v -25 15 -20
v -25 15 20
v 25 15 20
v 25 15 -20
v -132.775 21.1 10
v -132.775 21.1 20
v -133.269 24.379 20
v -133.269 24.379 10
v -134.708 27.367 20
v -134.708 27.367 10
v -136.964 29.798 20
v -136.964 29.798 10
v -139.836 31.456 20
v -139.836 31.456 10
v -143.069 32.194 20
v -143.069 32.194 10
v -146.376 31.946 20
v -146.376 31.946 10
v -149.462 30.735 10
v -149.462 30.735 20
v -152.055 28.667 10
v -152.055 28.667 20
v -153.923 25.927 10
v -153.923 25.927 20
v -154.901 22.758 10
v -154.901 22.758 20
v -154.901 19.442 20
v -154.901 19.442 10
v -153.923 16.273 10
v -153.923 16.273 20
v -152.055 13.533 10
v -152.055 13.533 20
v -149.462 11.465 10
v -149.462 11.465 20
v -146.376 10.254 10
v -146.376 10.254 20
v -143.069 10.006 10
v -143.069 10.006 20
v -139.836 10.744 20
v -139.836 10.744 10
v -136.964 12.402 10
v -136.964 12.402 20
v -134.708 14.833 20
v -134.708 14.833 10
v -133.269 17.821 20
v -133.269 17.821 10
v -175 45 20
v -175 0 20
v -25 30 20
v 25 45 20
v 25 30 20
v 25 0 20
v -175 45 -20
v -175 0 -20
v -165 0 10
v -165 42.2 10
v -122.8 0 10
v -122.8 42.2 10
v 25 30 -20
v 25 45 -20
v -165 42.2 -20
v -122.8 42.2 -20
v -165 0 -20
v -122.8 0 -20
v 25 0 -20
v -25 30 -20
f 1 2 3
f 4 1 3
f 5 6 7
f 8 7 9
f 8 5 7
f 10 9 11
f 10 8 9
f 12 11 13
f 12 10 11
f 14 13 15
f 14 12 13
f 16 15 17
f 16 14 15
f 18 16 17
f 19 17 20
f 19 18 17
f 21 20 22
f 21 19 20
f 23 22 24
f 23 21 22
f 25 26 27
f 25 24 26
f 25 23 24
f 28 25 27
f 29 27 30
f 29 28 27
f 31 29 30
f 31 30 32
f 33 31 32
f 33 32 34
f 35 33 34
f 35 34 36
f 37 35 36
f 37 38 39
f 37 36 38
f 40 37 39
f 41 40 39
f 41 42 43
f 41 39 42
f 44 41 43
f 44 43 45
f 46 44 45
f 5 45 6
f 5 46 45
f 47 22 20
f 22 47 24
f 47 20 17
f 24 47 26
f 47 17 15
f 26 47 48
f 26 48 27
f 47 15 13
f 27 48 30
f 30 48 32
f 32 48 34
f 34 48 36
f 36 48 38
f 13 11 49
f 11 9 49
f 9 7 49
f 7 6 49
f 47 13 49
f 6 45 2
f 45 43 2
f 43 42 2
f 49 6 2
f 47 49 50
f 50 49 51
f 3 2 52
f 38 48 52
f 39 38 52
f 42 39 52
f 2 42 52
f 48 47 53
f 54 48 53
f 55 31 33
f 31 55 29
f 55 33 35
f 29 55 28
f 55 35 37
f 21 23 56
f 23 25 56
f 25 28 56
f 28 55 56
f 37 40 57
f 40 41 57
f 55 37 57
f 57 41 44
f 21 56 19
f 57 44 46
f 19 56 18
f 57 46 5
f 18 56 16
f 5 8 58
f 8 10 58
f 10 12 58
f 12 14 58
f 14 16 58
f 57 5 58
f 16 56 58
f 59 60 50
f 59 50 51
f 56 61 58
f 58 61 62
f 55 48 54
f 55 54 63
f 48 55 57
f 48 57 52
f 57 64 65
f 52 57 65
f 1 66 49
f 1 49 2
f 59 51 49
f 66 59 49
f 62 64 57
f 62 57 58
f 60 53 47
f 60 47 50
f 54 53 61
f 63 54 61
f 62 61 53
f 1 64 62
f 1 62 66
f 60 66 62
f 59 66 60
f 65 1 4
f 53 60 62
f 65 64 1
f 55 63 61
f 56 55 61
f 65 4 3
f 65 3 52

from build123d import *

# Parameters (mm, degrees)
CROQUIS1_W              = 350
CROQUIS1_H              = 40
SALIENTE_EXTRUIR1_DEPTH = 45
CROQUIS2_W              = 42.2
CROQUIS2_H              = 42.2
CORTAR_EXTRUIR1_DEPTH   = 30
CROQUIS3_R              = 11.125
CORTAR_EXTRUIR2_DEPTH   = 30
CROQUIS4_R              = 11.125
CORTAR_EXTRUIR3_DEPTH   = 186.067555233


with BuildPart() as part:
    # Croquis1 → Saliente-Extruir1 (new body)
    with BuildSketch(Plane(origin=(0, 0, 0), x_dir=(1, 0, 0), z_dir=(0, 1, 0))):
        Rectangle(CROQUIS1_W, CROQUIS1_H)
    extrude(amount=SALIENTE_EXTRUIR1_DEPTH)

    # Croquis2 → Cortar-Extruir1 (cut)
    with BuildSketch(Plane(origin=(0, 0, -20), x_dir=(-1, 0, 0), z_dir=(0, 0, -1))):
        with Locations((-143.9, 21.1)):
            Rectangle(CROQUIS2_W, CROQUIS2_H)
    cortar_extruir1 = extrude(amount=-CORTAR_EXTRUIR1_DEPTH, mode=Mode.SUBTRACT)

    # Croquis3 → Cortar-Extruir2 (cut)
    with BuildSketch(Plane(origin=(0, 0, 10), x_dir=(-1, 0, 0), z_dir=(0, 0, -1))):
        with Locations((-143.9, 21.1)):
            Circle(CROQUIS3_R)
    cortar_extruir2 = extrude(amount=-CORTAR_EXTRUIR2_DEPTH, mode=Mode.SUBTRACT)

    # Simetría1: Cortar-Extruir1, Cortar-Extruir2 across plane
    add(cortar_extruir1.mirror(Plane(origin=(0, 0, 0), x_dir=(0, 0, 1), z_dir=(1, 0, 0))), mode=Mode.SUBTRACT)
    add(cortar_extruir2.mirror(Plane(origin=(0, 0, 0), x_dir=(0, 0, 1), z_dir=(1, 0, 0))), mode=Mode.SUBTRACT)

    # Croquis4 → Cortar-Extruir3 (cut, through all)
    with BuildSketch(Plane.XY.offset(20)):
        Polygon((25, 15), (25, 0), (175, 0), (175, 45), (25, 45), (25, 30), (-25, 30), (-25, 15), align=None)
        with Locations((143.9, 21.1)):
            Circle(CROQUIS4_R, mode=Mode.SUBTRACT)
    extrude(amount=-CORTAR_EXTRUIR3_DEPTH, mode=Mode.SUBTRACT)


solid = part.part
